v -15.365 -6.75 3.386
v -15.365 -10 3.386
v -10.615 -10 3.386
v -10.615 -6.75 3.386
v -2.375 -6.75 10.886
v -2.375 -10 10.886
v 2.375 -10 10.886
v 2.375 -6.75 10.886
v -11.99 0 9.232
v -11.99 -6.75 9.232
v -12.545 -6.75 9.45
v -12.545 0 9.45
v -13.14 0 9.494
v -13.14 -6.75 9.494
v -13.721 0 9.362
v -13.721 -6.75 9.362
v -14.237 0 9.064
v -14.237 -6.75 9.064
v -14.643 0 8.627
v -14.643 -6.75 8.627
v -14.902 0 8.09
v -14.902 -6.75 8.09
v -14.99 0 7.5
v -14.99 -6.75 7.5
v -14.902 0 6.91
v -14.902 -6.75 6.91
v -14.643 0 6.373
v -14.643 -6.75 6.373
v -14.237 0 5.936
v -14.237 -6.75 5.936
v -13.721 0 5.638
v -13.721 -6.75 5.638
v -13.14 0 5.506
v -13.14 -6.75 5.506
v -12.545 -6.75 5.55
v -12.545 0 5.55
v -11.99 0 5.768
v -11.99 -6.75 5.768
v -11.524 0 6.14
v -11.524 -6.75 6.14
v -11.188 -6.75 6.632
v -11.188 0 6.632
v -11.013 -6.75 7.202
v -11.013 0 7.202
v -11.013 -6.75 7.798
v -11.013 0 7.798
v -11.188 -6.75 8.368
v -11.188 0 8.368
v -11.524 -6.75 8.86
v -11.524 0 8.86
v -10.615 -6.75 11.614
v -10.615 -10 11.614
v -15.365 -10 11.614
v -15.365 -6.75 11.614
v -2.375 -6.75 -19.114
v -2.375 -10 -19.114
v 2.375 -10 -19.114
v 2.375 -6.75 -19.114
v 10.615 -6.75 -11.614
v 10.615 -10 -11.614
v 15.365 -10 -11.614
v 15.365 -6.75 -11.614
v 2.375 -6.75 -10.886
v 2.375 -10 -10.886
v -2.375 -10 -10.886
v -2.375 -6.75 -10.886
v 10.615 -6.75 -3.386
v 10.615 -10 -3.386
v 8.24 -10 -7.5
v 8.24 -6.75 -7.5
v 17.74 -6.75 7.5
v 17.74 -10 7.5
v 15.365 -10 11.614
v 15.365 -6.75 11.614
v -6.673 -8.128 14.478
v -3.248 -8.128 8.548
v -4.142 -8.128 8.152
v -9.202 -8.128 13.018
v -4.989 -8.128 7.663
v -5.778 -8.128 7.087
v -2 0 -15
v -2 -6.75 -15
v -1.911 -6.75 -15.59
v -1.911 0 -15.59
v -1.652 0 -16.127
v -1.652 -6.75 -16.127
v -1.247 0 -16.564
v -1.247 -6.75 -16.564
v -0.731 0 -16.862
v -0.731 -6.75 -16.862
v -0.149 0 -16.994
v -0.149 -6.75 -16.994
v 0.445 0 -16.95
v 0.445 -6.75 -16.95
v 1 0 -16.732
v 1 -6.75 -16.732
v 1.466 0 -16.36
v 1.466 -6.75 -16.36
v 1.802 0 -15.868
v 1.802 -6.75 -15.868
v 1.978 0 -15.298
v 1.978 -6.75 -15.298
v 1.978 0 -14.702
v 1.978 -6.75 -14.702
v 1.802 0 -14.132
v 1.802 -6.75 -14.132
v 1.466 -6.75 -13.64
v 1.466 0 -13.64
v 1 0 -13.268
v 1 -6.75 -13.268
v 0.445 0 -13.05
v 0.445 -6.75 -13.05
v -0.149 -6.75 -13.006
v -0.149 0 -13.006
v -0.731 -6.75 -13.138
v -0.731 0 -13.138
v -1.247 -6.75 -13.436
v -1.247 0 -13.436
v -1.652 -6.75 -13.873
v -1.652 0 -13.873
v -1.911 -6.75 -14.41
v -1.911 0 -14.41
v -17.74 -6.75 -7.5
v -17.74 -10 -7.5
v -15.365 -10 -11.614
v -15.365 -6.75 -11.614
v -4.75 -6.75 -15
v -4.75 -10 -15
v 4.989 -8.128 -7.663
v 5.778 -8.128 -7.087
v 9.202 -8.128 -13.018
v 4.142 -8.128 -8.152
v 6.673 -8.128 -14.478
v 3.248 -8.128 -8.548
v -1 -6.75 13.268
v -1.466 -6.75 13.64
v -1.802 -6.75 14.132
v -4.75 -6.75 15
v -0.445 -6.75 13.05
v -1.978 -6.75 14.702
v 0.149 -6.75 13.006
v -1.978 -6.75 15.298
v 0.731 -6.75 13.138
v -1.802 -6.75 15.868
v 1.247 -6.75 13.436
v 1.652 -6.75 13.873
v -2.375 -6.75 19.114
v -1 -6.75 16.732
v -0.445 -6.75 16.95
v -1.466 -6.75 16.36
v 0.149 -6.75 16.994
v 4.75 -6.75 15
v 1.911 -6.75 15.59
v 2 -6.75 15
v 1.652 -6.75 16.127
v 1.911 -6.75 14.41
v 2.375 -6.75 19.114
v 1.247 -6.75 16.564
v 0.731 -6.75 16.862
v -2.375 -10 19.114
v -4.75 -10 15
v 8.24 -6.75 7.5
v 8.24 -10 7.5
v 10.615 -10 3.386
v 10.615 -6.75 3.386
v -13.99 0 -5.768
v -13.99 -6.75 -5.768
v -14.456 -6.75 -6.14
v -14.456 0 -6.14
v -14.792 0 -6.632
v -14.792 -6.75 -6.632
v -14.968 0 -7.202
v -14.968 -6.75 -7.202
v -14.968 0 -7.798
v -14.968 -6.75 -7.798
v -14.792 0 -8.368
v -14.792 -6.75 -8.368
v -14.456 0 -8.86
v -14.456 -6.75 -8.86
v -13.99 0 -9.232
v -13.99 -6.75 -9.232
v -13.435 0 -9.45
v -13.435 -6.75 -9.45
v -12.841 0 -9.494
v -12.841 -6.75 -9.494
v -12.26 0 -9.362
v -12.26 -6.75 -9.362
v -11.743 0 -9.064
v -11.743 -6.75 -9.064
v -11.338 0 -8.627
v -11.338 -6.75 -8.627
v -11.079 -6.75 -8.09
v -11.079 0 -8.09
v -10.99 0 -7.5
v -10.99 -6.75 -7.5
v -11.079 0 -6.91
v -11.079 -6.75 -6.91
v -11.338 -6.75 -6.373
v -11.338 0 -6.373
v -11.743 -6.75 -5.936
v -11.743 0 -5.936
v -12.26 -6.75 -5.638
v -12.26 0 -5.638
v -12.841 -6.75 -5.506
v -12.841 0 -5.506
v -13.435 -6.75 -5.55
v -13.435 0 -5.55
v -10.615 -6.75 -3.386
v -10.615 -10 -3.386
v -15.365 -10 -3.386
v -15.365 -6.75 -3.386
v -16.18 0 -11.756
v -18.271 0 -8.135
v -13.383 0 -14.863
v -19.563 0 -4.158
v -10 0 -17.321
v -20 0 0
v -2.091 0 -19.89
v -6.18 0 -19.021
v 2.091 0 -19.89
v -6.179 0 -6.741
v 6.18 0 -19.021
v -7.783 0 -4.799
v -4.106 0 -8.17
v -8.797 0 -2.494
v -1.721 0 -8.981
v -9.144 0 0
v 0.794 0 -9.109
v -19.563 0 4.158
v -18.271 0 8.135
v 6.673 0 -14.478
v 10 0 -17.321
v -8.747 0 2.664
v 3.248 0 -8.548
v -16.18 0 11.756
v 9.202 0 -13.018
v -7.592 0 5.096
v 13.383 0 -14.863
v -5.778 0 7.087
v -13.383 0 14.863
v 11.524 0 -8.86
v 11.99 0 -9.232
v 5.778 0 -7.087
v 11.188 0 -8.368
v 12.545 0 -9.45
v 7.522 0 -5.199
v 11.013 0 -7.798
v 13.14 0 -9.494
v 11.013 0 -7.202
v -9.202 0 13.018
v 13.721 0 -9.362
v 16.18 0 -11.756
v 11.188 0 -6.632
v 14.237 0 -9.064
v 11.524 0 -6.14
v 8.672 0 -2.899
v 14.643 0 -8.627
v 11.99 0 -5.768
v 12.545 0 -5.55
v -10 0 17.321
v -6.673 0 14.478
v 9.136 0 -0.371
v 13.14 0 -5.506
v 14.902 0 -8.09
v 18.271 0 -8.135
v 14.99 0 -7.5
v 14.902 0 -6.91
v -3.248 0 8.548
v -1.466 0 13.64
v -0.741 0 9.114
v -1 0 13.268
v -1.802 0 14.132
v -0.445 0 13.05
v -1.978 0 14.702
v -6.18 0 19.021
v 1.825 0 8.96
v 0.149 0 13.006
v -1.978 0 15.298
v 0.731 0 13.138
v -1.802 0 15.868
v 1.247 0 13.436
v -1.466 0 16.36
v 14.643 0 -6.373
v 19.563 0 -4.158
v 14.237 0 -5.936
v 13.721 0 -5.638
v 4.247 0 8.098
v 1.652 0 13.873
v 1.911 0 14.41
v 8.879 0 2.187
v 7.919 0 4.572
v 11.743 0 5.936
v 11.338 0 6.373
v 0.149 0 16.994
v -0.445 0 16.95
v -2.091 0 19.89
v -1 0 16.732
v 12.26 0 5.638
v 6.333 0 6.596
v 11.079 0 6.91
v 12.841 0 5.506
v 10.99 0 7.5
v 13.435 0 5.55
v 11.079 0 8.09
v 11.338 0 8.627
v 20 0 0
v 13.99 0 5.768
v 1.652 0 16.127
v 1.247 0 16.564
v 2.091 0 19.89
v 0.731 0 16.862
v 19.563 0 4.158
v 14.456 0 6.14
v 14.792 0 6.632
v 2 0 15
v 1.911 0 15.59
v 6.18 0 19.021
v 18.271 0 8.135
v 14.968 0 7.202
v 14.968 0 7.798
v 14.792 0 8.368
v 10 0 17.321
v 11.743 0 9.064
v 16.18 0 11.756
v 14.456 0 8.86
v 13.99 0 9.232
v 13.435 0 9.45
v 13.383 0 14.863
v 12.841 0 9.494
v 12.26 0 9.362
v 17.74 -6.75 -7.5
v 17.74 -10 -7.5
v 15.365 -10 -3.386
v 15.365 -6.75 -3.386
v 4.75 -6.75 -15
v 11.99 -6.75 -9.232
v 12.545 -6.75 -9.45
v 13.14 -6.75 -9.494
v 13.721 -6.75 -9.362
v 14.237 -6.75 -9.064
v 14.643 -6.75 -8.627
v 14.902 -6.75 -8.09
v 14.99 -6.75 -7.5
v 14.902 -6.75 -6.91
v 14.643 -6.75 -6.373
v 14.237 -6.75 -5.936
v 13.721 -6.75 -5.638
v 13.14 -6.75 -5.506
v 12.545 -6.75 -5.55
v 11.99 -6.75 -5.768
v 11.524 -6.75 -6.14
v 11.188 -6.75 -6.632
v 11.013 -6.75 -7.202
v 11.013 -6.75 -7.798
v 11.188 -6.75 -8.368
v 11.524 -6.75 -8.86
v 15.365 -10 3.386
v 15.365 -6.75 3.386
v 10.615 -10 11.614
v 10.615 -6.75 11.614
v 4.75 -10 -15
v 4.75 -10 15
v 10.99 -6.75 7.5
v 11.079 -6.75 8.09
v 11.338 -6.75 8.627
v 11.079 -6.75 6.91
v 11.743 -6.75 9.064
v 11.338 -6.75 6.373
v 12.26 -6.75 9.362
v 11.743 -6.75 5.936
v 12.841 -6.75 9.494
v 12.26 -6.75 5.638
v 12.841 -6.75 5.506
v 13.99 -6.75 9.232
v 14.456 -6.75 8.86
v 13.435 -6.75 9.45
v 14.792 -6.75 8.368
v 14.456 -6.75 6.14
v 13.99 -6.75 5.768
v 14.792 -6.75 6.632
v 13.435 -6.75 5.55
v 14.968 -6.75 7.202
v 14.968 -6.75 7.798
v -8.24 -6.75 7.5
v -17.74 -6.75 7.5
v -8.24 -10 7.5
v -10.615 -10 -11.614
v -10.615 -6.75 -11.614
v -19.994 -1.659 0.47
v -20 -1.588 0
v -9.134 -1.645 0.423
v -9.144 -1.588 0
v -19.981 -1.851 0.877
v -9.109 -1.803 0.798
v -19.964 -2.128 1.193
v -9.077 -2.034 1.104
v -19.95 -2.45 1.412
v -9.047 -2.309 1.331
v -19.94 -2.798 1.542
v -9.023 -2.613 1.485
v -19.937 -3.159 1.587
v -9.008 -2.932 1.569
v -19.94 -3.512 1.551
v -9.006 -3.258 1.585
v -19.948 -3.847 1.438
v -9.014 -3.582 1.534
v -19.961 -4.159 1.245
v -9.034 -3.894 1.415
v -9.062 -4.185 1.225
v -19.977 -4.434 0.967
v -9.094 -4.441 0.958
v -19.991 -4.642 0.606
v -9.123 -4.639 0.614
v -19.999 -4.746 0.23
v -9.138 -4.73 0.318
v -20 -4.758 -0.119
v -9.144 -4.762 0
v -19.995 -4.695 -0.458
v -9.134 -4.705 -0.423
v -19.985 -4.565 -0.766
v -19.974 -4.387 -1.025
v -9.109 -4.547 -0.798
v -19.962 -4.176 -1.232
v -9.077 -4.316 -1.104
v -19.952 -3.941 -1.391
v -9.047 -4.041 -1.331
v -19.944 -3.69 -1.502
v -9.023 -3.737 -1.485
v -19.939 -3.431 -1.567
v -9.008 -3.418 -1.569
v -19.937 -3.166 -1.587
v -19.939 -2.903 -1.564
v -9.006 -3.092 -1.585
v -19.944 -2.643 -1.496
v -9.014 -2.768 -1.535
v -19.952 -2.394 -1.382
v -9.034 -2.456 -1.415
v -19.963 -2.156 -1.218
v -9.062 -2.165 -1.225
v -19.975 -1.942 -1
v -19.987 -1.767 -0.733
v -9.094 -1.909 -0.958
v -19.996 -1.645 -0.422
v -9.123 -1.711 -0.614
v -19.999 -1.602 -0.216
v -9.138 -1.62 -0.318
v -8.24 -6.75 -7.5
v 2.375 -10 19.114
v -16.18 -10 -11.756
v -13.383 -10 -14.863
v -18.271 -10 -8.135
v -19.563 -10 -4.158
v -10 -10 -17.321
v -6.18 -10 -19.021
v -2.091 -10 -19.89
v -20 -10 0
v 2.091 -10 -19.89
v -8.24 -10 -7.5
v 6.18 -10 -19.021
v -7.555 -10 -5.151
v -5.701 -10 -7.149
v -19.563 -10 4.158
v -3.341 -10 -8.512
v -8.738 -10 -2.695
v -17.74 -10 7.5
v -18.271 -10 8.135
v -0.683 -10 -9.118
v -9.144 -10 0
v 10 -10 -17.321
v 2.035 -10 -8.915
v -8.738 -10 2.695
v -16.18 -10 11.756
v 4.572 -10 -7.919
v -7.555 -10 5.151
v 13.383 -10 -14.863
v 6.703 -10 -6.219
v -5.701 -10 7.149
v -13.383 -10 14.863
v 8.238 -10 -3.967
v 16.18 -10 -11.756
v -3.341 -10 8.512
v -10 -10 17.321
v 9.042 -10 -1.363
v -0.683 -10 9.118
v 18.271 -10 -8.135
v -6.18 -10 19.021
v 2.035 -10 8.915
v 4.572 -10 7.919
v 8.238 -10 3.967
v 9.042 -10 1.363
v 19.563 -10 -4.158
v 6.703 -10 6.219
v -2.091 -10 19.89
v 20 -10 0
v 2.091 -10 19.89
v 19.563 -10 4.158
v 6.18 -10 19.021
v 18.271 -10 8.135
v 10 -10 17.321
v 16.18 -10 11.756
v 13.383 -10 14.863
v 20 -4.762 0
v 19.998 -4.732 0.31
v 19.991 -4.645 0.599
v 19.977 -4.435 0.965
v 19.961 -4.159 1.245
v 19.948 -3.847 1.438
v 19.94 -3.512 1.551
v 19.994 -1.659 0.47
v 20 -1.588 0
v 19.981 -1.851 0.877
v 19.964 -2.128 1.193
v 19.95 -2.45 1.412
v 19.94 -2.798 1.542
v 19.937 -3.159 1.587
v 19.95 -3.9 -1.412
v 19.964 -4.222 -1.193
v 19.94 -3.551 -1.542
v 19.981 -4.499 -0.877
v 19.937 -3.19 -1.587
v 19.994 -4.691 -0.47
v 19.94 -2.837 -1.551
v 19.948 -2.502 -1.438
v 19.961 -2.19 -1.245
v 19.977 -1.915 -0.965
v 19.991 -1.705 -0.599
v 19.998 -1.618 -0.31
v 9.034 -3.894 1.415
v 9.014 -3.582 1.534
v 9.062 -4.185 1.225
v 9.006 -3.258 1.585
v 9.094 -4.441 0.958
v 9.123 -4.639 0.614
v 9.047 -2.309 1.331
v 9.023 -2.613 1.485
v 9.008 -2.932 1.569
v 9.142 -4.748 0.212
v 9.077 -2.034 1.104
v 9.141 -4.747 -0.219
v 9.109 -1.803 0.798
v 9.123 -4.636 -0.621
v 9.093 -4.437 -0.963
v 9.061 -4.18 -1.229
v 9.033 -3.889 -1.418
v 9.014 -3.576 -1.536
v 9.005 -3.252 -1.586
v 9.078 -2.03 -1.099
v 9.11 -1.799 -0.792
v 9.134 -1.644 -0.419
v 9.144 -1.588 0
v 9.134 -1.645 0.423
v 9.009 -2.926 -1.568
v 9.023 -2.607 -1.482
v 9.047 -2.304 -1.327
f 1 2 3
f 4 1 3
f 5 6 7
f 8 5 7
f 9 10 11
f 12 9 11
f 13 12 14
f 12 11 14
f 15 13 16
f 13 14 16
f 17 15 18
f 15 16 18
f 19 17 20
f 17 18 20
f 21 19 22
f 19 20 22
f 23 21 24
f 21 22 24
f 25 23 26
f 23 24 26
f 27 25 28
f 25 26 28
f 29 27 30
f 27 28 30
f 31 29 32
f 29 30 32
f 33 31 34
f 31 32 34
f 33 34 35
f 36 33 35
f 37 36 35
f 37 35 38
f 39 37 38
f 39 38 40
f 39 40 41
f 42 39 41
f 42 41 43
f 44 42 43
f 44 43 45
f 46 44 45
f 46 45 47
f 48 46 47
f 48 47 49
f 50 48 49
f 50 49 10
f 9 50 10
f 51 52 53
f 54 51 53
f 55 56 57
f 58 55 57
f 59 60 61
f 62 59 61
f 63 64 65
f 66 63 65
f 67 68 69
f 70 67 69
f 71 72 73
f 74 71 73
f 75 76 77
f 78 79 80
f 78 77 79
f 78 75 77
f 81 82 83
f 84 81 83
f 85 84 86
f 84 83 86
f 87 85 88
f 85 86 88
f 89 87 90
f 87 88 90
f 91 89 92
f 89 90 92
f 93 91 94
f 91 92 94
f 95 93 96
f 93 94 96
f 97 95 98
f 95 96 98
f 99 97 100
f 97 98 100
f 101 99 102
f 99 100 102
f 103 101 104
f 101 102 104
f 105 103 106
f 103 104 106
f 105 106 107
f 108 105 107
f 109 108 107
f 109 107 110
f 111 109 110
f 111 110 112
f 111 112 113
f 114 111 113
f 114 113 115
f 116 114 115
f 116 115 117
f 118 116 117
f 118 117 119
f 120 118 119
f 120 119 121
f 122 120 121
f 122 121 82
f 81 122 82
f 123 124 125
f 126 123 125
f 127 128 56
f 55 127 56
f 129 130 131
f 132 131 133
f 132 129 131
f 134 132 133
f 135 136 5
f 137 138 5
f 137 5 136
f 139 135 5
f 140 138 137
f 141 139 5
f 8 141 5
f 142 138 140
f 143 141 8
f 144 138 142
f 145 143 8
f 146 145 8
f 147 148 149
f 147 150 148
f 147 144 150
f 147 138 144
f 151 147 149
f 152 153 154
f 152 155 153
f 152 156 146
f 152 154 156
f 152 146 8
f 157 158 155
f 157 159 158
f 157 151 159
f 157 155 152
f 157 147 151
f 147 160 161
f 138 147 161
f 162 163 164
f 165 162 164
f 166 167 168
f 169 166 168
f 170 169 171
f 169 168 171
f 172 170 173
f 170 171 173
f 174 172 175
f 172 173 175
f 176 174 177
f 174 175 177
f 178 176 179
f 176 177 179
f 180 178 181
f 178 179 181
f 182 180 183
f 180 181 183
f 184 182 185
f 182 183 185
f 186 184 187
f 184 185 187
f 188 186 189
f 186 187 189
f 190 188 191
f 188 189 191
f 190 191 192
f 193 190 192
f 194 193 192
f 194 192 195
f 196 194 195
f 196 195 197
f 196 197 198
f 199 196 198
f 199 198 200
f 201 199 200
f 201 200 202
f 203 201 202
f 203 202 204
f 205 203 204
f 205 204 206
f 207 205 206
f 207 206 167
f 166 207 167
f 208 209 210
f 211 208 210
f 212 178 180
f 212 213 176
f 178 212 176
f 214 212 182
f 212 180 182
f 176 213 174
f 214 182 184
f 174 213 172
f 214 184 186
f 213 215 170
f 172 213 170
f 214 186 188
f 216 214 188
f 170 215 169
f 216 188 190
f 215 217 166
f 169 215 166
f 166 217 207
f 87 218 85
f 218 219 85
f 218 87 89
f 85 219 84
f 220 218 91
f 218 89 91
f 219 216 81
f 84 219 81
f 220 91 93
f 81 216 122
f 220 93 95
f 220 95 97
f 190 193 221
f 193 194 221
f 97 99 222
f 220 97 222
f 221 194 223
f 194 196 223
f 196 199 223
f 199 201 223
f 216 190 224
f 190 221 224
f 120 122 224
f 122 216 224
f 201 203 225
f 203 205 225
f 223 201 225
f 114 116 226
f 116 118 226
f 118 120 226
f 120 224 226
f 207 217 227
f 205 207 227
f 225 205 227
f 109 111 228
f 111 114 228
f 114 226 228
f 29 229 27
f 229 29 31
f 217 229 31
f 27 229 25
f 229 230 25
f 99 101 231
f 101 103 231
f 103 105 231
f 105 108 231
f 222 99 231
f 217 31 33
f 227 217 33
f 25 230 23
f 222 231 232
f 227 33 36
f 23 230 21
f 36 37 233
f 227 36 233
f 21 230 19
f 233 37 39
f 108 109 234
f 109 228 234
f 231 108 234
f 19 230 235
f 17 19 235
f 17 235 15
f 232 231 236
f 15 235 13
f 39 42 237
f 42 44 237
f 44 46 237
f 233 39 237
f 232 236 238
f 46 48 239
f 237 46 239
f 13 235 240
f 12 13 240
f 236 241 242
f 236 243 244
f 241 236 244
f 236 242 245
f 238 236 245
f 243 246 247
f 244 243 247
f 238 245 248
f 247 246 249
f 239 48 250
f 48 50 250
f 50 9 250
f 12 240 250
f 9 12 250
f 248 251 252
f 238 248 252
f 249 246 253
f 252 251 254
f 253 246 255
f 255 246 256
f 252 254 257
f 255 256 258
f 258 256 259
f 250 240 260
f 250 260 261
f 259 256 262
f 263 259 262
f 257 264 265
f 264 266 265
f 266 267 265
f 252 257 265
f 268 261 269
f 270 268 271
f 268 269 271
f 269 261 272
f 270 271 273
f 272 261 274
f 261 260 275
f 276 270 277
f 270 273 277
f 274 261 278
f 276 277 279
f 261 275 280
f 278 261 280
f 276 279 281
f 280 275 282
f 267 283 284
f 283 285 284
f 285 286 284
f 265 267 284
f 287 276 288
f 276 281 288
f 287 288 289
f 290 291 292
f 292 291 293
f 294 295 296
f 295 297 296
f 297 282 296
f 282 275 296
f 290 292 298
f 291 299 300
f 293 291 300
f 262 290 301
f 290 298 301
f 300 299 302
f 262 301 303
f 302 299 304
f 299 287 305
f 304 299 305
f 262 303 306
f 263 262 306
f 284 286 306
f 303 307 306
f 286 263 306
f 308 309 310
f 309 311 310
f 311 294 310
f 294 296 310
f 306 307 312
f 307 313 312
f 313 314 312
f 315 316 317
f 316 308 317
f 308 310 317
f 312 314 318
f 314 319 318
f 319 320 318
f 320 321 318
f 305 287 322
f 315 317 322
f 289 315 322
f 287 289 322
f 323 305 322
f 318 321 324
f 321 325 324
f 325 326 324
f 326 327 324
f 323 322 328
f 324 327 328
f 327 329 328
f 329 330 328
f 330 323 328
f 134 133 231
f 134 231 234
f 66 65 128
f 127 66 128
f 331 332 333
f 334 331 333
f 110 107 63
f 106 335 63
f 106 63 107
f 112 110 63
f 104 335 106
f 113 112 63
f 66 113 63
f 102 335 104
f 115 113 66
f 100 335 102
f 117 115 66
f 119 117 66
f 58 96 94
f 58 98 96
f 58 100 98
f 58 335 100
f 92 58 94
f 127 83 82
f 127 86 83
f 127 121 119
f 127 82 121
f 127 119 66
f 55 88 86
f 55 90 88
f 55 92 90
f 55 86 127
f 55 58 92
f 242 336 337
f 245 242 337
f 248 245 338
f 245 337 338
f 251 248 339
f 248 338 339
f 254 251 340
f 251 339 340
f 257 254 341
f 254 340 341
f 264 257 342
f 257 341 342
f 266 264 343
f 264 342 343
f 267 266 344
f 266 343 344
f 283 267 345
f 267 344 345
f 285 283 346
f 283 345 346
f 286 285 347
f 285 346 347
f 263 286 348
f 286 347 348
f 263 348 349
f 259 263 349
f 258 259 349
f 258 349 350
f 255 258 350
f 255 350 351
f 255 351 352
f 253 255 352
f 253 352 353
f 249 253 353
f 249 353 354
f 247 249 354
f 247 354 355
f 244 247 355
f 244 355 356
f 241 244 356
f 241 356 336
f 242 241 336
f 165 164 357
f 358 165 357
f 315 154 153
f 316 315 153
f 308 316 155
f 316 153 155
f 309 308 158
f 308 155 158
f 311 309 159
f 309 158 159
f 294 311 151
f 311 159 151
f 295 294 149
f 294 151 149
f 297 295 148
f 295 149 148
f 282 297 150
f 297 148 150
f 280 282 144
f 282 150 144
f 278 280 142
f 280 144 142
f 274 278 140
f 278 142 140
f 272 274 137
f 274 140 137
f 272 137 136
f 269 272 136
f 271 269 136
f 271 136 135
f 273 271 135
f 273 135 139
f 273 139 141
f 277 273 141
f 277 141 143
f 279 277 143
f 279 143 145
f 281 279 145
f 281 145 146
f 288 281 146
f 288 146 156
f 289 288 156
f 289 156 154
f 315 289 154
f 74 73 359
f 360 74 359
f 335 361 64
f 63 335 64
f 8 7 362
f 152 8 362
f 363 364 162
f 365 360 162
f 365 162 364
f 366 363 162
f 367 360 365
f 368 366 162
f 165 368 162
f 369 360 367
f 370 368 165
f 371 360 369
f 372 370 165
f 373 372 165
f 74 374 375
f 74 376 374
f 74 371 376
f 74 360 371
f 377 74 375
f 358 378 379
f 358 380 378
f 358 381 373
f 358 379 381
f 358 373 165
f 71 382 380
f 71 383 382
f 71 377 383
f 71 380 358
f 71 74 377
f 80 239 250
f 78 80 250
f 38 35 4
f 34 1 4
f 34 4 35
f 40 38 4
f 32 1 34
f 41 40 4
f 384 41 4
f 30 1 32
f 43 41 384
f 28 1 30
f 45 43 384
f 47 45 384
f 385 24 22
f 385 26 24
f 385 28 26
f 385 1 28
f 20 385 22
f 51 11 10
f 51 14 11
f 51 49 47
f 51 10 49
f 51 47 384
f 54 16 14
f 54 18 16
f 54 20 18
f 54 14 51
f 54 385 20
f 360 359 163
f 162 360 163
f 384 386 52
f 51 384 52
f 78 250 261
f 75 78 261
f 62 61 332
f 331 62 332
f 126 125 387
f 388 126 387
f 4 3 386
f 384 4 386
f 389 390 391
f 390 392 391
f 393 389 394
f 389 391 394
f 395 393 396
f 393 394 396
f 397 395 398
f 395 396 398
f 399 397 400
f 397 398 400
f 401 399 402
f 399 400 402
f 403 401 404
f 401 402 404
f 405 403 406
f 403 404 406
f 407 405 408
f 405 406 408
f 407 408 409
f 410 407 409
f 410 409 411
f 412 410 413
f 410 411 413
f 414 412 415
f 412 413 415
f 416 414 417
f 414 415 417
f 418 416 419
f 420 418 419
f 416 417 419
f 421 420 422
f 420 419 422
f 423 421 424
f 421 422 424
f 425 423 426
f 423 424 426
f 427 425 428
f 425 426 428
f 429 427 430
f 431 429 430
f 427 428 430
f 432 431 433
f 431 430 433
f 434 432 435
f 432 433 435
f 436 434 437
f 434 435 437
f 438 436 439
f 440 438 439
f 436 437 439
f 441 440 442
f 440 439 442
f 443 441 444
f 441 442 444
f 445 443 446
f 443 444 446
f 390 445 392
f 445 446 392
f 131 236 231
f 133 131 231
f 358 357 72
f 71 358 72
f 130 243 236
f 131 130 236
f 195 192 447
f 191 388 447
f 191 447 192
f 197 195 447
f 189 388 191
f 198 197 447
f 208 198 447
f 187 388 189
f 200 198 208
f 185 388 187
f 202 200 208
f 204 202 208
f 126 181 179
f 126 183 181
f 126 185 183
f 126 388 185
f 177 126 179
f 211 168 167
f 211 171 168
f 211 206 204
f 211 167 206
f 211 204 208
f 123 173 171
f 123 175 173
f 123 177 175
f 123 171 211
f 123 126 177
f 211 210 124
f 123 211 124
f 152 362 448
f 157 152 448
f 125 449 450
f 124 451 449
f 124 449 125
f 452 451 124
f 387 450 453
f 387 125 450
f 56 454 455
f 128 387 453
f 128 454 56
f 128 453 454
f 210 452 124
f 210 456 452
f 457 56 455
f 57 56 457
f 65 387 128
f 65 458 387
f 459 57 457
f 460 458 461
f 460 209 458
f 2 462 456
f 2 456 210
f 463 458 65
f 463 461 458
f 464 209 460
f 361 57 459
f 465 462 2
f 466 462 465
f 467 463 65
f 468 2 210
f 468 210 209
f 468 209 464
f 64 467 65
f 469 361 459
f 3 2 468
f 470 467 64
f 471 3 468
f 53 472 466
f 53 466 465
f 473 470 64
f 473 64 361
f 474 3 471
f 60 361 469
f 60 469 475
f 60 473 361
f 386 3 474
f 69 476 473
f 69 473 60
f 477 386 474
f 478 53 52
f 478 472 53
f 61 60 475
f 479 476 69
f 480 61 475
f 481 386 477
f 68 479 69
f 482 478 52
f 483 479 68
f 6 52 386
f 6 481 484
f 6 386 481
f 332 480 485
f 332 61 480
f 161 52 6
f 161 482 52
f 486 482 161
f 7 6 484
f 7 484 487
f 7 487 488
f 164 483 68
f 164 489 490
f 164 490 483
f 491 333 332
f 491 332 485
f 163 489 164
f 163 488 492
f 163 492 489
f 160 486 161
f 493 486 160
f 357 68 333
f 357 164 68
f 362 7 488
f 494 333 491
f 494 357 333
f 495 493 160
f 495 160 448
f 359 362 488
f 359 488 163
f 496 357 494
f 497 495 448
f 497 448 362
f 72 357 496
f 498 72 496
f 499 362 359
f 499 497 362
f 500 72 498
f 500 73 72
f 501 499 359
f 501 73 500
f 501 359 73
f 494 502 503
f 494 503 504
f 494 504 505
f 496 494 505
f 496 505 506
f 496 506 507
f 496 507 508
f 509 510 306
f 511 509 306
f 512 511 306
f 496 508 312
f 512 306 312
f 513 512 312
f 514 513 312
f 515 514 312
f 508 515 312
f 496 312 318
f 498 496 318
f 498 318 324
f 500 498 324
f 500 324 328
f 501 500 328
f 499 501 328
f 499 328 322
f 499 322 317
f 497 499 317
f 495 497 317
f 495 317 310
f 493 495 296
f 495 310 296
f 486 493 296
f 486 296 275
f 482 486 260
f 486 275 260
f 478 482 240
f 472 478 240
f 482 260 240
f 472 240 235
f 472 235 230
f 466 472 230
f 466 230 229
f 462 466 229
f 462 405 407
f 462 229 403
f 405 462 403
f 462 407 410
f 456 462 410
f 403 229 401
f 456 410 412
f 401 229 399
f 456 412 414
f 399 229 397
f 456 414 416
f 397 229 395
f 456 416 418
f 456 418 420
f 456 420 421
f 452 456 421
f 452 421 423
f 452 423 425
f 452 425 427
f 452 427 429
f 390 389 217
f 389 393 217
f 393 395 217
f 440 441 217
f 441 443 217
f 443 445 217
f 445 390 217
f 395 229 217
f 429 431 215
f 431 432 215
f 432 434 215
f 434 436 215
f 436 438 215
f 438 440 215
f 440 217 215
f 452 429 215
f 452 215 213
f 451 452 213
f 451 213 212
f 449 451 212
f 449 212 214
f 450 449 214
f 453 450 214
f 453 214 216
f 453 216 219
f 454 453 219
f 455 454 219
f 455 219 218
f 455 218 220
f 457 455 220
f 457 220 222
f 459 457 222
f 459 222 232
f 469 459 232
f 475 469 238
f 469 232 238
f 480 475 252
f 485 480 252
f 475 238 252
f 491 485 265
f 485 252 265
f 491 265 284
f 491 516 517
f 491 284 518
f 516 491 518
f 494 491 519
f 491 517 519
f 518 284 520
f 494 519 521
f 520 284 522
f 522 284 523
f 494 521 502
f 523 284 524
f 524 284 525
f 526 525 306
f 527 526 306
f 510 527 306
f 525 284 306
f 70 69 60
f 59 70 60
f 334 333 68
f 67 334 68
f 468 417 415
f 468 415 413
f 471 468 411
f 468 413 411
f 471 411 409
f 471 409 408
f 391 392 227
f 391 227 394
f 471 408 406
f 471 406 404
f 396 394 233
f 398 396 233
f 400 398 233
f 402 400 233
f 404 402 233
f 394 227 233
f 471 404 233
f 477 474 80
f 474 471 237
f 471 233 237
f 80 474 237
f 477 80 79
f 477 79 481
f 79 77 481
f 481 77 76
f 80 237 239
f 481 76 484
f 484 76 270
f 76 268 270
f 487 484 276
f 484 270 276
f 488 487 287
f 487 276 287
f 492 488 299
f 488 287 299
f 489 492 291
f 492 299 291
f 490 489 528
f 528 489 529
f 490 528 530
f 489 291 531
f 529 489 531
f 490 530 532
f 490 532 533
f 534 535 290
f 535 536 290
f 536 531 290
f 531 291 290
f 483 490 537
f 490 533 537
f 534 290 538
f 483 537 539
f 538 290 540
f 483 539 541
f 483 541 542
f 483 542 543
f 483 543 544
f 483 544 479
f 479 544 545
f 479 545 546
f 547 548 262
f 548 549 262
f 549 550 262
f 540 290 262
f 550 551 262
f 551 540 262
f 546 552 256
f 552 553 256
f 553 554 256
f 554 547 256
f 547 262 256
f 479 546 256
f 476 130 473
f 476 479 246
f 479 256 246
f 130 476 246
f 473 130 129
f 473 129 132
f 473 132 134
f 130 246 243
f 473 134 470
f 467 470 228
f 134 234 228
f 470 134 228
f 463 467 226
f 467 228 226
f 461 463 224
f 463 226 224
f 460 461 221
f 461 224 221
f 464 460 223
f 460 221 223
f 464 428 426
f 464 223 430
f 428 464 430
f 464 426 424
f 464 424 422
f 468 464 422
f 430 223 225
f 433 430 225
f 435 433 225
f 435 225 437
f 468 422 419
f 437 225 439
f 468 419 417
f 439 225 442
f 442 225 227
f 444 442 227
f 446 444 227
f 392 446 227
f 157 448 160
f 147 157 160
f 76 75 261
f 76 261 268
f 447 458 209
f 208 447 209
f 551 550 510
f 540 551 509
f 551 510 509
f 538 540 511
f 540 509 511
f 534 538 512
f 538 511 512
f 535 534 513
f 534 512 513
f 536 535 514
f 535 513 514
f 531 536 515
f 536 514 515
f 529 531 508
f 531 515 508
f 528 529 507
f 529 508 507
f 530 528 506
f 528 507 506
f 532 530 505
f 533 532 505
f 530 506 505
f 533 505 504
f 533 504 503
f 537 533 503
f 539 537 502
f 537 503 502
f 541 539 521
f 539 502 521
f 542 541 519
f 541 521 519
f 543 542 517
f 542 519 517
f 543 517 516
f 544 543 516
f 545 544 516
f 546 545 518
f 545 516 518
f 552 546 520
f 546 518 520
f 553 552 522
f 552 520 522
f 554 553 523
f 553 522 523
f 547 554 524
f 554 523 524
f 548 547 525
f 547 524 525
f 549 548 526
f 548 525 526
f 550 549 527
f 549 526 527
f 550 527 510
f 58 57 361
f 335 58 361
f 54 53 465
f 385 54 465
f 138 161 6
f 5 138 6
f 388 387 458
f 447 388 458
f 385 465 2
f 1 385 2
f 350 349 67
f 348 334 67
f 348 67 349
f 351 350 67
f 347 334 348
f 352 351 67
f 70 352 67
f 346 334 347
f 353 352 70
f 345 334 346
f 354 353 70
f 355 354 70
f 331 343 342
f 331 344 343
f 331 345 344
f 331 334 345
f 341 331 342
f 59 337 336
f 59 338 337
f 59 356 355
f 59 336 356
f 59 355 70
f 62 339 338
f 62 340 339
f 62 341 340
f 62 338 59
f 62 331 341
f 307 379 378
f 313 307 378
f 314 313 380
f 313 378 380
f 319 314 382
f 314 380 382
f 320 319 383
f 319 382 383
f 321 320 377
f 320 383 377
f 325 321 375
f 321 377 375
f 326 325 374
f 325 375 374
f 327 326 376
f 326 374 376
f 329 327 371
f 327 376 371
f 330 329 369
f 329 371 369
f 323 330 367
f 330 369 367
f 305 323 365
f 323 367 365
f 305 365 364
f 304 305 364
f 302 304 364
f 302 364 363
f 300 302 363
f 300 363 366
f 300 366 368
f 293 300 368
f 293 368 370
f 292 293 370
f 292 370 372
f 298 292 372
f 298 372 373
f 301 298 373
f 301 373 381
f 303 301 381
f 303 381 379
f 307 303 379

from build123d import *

# Parameters (mm, degrees)
F0_R            = 20
F1_DEPTH        = 10
F3_DEPTH        = 8.5
F4_R            = 2
F5_DEPTH        = 10.001
F5_COPIES_COUNT = 6
F7_DEPTH        = 3.25
F7_COPIES_COUNT = 6
F8_R            = 5.08
F9_DEPTH        = 10.001
F10_R           = 9.144
F11_DEPTH       = 10.001
F13_DEPTH       = 8.128
F14_R           = 1.5875
F15_DEPTH       = 25.4


# Not quite as in the source:
# - a pattern or mirror of a feature is missing from the dataset's text; its kind, count and spacing are read off the source's solid


with BuildPart() as f1:
    # F0 (on Front) → F1 (new body)
    with BuildSketch(Plane.XZ):
        Circle(F0_R)
    extrude(amount=F1_DEPTH)

    # F2 (on face) → F3 (cut)
    with BuildSketch(Plane(origin=(0, 0, 0), x_dir=(-1, 0, 0), z_dir=(0, 1, 0))):
        Polygon((3.3197640478, 5.75), (-3.3197640478, 5.75), (-6.6395280957, 0), (-3.3197640478, -5.75), (3.3197640478, -5.75), (6.6395280957, 0), align=None)
    extrude(amount=-F3_DEPTH, mode=Mode.SUBTRACT)

    # F4 (on face) → F5 (cut, through all)
    with BuildSketch(Plane.XZ.offset(10)):
        with Locations((0, 15)):
            Circle(F4_R)
    f5 = extrude(amount=-F5_DEPTH, mode=Mode.SUBTRACT)

    # F5_copies: F5 ×6 about axis
    f5_copies_axis = Axis((0, 0, 0), (0, 1, 0))
    for i in range(1, F5_COPIES_COUNT):
        add(f5.rotate(f5_copies_axis, i * 360 / F5_COPIES_COUNT), mode=Mode.SUBTRACT)

    # F6 (on face) → F7 (cut)
    with BuildSketch(Plane.XZ.offset(10)):
        Polygon((2.375, 19.113620668), (-2.375, 19.113620668), (-4.75, 15), (-2.375, 10.886379332), (2.375, 10.886379332), (4.75, 15), align=None)
    f7 = extrude(amount=-F7_DEPTH, mode=Mode.SUBTRACT)

    # F7_copies: F7 ×6 about axis
    f7_copies_axis = Axis((0, 0, 0), (0, 1, 0))
    for i in range(1, F7_COPIES_COUNT):
        add(f7.rotate(f7_copies_axis, i * 360 / F7_COPIES_COUNT), mode=Mode.SUBTRACT)

    # F8 (on face) → F9 (cut, through all)
    with BuildSketch(Plane.XZ.offset(10)):
        Circle(F8_R)
    extrude(amount=-F9_DEPTH, mode=Mode.SUBTRACT)

    # F10 (on face) → F11 (cut, through all)
    with BuildSketch(Plane(origin=(0, 0, 0), x_dir=(-1, 0, 0), z_dir=(0, 1, 0))):
        Circle(F10_R)
    extrude(amount=-F11_DEPTH, mode=Mode.SUBTRACT)

    # F12 (on face) → F13 (cut)
    with BuildSketch(Plane(origin=(0, 0, 0), x_dir=(-1, 0, 0), z_dir=(0, 1, 0))):
        Polygon((9.2023301022, 13.0179032851), (6.6726698978, 14.4784032851), (-9.2023301022, -13.0179032851), (-6.6726698978, -14.4784032851), align=None)
    extrude(amount=-F13_DEPTH, mode=Mode.SUBTRACT)

    # F14 (on Right) → F15 (cut, symmetric)
    with BuildSketch(Plane.YZ):
        with Locations((-3.175, 0)):
            Circle(F14_R)
    extrude(amount=F15_DEPTH, both=True, mode=Mode.SUBTRACT)


solid = f1.part
